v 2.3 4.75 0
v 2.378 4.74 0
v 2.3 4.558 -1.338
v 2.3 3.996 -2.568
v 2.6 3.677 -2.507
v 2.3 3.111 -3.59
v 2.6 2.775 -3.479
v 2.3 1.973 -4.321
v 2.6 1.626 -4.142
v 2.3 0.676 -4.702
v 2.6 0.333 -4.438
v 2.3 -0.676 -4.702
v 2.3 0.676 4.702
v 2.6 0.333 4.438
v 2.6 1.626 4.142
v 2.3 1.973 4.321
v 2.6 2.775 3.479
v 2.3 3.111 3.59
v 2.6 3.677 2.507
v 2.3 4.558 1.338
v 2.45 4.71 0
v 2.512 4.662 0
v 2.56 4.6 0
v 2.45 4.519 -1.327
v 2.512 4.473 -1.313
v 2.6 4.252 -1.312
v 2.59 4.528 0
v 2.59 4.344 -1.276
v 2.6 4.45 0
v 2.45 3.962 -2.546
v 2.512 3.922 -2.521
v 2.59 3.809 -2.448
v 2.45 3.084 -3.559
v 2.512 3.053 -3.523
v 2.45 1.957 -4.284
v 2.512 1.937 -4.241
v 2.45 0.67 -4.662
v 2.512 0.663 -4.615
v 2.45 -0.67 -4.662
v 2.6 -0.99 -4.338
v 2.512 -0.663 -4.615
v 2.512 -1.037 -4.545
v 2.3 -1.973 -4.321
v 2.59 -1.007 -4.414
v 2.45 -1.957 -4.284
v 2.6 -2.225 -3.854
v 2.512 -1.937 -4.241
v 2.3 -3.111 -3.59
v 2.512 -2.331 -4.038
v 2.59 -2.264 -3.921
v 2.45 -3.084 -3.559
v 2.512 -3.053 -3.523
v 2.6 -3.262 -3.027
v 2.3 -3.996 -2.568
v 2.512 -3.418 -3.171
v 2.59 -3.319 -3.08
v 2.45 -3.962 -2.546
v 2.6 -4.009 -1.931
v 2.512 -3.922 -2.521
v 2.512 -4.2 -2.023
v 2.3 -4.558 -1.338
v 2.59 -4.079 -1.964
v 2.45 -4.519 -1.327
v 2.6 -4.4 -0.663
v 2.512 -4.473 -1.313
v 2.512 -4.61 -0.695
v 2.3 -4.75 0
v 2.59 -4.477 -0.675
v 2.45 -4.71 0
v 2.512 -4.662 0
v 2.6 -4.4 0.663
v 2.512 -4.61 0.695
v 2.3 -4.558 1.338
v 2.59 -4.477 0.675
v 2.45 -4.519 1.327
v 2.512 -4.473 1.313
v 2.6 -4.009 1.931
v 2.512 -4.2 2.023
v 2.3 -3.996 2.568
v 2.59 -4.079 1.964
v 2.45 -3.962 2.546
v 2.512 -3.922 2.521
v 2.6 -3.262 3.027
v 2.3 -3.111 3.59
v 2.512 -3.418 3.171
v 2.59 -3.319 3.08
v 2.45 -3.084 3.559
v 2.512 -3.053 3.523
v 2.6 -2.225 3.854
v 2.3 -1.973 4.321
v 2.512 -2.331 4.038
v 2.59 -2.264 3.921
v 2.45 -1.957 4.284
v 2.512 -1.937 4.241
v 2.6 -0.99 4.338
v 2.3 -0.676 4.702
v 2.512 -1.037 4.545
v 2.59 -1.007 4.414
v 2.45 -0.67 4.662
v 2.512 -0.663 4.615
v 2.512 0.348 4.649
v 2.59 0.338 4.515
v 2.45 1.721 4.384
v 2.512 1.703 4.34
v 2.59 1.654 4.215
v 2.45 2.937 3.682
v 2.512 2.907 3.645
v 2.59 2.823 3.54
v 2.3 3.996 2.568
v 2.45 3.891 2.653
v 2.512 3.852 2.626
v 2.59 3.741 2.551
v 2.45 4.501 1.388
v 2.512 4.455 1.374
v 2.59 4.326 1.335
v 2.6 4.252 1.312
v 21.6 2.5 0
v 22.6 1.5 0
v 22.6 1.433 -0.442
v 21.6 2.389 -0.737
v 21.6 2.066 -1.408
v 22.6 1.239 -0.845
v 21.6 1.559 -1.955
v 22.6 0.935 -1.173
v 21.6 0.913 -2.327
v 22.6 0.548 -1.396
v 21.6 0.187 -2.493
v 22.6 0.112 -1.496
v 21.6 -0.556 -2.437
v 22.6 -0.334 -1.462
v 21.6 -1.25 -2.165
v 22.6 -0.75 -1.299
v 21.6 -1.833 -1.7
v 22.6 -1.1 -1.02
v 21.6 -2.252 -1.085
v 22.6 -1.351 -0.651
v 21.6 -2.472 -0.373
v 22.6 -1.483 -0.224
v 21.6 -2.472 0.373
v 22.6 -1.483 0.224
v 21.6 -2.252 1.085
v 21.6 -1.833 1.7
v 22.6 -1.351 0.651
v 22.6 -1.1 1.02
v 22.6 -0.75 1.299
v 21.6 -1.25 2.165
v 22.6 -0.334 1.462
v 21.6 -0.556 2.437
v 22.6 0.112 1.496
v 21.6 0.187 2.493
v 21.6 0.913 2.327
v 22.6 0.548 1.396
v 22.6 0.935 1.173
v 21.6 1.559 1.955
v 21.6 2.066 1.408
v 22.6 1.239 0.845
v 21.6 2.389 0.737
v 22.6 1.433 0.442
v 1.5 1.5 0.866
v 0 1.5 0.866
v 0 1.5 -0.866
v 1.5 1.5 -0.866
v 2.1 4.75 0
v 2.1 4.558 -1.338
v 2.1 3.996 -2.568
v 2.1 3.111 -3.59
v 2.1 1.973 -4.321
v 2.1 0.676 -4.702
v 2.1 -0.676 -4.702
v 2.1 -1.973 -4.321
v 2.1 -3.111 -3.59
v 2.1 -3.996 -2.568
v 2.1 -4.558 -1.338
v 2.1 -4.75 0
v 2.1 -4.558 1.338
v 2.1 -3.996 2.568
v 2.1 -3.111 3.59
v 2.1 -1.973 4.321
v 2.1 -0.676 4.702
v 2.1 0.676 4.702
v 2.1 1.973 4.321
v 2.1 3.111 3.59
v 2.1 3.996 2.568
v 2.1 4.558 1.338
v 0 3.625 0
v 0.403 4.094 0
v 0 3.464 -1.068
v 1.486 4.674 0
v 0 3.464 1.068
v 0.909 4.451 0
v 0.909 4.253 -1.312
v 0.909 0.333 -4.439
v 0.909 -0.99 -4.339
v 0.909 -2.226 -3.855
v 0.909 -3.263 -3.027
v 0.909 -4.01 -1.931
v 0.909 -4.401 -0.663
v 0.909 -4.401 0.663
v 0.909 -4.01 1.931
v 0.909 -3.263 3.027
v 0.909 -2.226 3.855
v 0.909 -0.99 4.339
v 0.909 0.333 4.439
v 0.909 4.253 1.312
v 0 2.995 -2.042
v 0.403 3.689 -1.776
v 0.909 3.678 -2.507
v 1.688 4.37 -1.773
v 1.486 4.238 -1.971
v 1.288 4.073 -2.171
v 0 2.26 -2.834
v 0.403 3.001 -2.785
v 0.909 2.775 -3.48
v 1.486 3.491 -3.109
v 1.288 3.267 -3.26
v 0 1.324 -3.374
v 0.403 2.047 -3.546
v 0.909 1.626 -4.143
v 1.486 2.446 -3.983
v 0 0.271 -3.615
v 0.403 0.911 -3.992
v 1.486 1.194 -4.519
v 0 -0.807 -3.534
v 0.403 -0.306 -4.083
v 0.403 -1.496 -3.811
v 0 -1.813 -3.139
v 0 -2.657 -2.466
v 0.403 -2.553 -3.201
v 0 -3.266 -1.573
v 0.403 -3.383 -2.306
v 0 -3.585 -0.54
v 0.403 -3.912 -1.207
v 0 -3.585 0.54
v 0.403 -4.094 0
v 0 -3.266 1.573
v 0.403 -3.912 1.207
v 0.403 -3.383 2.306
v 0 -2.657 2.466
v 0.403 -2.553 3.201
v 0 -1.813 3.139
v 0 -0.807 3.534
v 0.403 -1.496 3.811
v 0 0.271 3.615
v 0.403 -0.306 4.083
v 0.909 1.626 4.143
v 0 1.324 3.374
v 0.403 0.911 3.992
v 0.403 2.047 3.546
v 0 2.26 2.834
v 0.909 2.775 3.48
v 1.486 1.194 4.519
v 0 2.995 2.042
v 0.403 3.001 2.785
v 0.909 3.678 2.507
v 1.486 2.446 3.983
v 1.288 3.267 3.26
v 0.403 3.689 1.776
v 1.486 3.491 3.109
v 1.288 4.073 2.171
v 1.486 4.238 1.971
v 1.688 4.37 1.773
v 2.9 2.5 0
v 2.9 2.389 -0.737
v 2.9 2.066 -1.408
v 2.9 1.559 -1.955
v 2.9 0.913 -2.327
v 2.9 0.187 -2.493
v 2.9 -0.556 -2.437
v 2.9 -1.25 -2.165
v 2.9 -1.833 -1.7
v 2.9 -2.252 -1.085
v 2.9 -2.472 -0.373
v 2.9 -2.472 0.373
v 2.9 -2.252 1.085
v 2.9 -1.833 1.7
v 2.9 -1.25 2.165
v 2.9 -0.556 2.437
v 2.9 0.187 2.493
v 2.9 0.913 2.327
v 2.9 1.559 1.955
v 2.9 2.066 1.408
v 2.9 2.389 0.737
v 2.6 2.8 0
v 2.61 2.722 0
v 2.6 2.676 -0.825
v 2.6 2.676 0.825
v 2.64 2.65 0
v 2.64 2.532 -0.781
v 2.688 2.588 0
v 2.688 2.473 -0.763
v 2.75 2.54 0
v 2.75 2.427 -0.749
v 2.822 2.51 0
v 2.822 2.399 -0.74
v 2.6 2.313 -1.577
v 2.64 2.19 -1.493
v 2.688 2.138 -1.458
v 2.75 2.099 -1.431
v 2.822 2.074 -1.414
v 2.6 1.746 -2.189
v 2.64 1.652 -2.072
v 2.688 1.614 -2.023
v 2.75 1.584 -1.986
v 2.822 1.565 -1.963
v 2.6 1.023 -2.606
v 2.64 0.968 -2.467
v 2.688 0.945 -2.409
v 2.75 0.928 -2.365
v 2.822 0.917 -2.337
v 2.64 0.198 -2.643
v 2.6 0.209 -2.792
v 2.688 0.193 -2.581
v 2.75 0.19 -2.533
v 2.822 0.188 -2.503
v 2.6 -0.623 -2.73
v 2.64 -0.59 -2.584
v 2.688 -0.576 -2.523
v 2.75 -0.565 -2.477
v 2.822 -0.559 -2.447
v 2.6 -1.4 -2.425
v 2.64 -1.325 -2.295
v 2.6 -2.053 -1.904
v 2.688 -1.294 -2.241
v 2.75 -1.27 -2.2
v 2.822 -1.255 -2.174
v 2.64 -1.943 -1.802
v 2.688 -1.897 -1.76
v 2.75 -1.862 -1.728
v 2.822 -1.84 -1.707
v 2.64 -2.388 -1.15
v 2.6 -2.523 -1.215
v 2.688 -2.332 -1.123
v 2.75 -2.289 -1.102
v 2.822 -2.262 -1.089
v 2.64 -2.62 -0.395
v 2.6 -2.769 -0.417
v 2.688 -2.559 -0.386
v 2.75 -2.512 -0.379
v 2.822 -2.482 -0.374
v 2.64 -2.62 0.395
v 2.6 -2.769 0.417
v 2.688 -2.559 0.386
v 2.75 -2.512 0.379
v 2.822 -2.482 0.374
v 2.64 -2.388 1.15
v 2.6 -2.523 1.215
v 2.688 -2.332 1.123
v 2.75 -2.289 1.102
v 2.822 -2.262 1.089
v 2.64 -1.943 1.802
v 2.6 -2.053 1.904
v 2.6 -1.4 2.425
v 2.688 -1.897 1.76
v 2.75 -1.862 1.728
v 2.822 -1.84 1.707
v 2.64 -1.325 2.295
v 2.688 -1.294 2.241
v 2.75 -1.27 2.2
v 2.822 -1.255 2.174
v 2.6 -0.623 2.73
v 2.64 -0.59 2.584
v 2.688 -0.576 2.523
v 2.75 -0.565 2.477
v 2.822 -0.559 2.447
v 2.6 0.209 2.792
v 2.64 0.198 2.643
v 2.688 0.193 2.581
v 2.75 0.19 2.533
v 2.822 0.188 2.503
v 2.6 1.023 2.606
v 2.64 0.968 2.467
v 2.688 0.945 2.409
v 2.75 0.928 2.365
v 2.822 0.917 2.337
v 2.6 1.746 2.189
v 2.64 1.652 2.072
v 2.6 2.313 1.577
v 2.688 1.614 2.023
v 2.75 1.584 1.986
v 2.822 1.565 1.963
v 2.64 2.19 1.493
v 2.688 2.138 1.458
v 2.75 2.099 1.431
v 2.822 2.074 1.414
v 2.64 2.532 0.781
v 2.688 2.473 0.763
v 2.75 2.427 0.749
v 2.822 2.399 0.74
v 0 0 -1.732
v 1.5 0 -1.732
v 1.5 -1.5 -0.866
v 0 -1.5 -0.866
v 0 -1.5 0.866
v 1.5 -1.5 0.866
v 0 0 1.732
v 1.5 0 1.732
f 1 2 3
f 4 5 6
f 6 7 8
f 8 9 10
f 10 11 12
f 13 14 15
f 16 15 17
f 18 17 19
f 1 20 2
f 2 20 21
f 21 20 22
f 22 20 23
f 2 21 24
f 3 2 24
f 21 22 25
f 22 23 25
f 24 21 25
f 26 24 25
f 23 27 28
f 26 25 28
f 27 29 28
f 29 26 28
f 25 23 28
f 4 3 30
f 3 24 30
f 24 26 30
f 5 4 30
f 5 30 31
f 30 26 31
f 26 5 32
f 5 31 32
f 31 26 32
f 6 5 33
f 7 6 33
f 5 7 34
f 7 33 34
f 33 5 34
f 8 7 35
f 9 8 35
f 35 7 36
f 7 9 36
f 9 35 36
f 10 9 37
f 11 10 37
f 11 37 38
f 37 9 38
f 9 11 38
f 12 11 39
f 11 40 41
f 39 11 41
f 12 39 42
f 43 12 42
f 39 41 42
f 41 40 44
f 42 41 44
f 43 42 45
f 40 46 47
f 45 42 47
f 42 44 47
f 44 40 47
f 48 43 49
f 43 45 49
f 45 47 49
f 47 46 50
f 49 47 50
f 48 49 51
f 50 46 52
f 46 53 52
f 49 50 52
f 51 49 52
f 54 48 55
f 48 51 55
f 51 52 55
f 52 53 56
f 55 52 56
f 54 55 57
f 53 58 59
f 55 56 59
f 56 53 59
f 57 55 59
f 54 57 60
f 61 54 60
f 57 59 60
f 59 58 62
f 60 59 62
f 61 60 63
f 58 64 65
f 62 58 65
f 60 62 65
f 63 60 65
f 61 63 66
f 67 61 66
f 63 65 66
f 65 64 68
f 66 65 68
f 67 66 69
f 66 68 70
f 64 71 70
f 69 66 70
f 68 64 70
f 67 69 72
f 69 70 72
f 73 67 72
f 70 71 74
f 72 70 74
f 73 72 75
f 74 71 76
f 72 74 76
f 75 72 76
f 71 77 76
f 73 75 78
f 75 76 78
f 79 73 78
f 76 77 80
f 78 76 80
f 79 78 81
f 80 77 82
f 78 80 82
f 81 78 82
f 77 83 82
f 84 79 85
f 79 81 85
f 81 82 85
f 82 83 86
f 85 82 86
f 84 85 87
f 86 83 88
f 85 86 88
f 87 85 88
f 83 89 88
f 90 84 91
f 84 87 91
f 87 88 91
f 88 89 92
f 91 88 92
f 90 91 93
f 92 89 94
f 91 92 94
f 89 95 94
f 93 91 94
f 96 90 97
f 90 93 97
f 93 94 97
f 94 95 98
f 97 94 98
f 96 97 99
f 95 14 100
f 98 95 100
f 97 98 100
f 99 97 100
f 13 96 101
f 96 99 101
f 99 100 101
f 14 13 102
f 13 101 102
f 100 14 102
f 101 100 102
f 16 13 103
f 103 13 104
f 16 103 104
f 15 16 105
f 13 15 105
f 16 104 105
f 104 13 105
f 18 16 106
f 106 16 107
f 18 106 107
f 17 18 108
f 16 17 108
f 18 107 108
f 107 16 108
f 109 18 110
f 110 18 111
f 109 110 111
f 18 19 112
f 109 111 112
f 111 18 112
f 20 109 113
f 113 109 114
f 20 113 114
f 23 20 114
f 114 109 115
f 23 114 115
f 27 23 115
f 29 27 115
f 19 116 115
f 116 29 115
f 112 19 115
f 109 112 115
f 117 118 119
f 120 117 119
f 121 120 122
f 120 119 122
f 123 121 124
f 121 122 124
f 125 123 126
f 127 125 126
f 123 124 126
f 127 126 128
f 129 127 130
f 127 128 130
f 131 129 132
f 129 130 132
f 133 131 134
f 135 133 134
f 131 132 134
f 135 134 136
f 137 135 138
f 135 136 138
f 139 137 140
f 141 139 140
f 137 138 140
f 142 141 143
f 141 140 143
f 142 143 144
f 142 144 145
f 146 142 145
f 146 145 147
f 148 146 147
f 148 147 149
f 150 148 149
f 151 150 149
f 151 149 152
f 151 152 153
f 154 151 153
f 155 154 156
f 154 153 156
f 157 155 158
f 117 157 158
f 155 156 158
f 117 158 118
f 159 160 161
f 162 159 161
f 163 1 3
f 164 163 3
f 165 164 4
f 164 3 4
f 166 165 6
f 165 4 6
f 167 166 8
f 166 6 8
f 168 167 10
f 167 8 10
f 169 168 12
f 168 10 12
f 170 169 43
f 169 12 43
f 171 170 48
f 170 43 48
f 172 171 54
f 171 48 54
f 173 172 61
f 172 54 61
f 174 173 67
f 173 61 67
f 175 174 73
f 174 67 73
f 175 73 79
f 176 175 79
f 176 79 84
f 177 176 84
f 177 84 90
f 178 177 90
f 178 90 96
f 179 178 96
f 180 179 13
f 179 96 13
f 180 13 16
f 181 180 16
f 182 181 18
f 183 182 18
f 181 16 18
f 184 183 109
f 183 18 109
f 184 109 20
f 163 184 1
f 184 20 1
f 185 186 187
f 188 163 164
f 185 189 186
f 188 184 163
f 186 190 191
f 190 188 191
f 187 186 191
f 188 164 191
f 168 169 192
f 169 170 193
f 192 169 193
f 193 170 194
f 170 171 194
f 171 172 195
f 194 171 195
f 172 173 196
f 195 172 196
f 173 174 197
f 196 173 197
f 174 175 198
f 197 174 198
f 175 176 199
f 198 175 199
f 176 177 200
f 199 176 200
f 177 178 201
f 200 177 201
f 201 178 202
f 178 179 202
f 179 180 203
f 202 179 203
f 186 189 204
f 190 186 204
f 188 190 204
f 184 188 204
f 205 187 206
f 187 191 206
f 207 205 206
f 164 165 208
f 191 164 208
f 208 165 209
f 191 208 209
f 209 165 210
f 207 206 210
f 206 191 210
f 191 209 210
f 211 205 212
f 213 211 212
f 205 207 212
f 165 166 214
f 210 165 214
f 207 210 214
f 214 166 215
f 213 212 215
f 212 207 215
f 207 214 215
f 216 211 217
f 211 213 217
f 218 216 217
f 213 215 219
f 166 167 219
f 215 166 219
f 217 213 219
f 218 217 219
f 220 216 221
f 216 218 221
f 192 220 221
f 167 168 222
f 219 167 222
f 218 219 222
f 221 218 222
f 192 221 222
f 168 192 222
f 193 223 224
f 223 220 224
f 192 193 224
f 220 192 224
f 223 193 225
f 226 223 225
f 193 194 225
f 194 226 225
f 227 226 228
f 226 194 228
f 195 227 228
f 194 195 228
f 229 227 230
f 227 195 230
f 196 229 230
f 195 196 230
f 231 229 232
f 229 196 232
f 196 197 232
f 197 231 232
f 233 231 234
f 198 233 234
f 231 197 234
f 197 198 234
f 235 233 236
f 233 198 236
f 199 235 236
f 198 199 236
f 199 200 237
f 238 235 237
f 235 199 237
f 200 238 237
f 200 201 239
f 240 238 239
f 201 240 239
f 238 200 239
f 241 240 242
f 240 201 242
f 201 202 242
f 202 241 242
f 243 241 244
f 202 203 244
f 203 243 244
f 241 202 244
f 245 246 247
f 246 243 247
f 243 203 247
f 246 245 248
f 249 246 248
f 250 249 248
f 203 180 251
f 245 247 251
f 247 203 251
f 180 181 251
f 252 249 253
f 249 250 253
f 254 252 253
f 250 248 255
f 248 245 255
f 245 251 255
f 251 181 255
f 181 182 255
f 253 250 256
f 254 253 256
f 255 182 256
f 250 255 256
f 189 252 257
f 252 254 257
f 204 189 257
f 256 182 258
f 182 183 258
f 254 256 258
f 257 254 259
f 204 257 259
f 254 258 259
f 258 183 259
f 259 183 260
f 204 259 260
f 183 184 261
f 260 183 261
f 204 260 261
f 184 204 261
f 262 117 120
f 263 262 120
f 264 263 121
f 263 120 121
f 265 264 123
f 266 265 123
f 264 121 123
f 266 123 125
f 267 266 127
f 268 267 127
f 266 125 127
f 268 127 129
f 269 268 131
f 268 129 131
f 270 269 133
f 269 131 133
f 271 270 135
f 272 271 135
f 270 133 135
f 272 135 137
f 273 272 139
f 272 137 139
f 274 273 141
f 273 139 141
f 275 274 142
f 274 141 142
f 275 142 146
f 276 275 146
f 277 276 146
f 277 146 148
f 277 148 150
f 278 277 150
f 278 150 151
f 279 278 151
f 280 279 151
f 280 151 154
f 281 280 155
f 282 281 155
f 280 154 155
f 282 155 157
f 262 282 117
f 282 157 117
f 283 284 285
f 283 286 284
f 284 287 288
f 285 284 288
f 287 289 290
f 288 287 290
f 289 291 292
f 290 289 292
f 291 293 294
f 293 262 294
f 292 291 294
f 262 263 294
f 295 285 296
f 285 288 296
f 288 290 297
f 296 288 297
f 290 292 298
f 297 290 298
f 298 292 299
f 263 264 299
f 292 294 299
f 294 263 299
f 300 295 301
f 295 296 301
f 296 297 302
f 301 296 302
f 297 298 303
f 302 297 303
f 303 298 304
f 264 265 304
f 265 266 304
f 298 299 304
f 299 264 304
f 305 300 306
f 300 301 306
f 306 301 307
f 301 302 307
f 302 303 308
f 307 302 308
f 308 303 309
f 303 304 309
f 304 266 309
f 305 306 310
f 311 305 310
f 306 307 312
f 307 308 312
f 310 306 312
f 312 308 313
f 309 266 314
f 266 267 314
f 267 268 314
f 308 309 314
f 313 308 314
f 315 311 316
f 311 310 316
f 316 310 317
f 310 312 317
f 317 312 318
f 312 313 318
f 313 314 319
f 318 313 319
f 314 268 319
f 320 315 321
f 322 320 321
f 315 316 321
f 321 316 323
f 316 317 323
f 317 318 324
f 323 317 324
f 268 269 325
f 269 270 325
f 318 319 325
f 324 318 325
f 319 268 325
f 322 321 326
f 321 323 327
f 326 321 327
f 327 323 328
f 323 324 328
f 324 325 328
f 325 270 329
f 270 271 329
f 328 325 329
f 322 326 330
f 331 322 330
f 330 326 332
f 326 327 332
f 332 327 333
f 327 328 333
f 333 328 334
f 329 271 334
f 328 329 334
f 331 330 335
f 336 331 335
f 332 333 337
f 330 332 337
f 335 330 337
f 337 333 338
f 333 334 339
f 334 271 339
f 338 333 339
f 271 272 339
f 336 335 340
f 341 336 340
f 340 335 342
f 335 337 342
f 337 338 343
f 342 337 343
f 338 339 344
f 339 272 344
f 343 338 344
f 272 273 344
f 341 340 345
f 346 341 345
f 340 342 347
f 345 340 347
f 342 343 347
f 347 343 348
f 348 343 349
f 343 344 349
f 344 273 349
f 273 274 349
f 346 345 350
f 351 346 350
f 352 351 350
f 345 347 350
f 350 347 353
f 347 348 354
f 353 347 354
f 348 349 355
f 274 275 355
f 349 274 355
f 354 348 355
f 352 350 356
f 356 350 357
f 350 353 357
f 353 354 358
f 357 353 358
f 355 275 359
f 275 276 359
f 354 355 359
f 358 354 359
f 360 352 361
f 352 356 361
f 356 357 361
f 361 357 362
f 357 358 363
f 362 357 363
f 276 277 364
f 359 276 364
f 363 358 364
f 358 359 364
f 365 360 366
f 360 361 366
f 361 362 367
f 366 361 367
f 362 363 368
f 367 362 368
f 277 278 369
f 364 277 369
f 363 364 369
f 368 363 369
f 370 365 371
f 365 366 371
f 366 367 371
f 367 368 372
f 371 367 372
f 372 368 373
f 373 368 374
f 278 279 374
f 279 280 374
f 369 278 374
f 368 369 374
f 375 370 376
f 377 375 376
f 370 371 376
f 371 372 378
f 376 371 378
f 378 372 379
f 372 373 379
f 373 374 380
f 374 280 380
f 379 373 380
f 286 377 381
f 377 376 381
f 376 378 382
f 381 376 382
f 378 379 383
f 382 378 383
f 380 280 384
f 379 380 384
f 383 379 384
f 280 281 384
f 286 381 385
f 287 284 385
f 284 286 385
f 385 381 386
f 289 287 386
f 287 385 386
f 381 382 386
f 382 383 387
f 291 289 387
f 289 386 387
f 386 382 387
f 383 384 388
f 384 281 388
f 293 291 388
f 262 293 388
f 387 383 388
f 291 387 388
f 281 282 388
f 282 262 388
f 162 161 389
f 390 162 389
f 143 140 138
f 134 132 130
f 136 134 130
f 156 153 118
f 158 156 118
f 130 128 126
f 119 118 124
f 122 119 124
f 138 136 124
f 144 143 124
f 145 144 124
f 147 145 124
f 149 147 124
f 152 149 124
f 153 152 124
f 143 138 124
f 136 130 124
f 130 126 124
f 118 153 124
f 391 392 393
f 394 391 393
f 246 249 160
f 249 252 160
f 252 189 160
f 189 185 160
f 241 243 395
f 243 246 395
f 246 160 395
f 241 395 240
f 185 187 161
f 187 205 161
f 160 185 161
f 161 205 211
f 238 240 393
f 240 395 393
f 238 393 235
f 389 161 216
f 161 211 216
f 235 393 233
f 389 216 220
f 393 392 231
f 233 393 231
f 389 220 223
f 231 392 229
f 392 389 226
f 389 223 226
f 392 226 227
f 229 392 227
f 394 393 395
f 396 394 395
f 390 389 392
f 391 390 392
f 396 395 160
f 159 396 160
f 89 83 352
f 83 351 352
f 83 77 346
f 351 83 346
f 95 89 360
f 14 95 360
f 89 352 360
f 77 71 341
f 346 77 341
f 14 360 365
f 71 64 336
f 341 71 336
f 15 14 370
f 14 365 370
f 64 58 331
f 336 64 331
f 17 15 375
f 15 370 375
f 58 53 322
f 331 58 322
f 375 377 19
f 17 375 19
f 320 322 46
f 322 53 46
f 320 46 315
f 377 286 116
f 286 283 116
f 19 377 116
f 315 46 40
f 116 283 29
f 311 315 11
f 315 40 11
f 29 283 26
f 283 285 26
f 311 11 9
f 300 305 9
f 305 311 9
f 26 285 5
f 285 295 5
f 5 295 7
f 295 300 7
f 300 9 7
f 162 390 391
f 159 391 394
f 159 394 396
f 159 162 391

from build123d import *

# Parameters (mm, degrees)
CUT_EXTRUDE_1_DEPTH = 1.5
FILLET_1_R          = 0.3
CHAMFER_1_SIZE      = 1


with BuildPart() as part:
    # Эскиз1 → Повернуть1 (revolve)
    with BuildSketch(Plane.XY):
        with BuildLine():
            Line((0, 0), (0, 3.625))
            ThreePointArc((0, 3.625), (0.908821487, 4.451033224), (2.1, 4.75))
            Line((2.1, 4.75), (2.6, 4.75))
            Line((2.6, 4.75), (2.6, 2.5))
            Line((2.6, 2.5), (22.6, 2.5))
            Line((22.6, 2.5), (22.6, 0))
            Line((22.6, 0), (0, 0))
        make_face()
    revolve(axis=Axis((22.6, 0, 0), (-1, 0, 0)))

    # Эскиз2 → Вырез-Вытянуть1 (cut)
    with BuildSketch(Plane.ZY):
        Polygon((0.866025404, 1.5), (-0.866025404, 1.5), (-1.732050808, 0), (-0.866025404, -1.5), (0.866025404, -1.5), (1.732050808, 0), align=None)
    extrude(amount=-CUT_EXTRUDE_1_DEPTH, mode=Mode.SUBTRACT)

    # Скругление1
    fillet_1_edges = [part.edges().sort_by_distance(p)[0] for p in [
        (2.6, -2.5, 0),
        (2.6, -4.75, 0),
    ]]
    fillet(fillet_1_edges, radius=FILLET_1_R)

    # Фаска1
    chamfer_1_edges = [part.edges().sort_by_distance(p)[0] for p in [
        (22.6, -2.5, 0),
    ]]
    chamfer(chamfer_1_edges, length=CHAMFER_1_SIZE)


solid = part.part
